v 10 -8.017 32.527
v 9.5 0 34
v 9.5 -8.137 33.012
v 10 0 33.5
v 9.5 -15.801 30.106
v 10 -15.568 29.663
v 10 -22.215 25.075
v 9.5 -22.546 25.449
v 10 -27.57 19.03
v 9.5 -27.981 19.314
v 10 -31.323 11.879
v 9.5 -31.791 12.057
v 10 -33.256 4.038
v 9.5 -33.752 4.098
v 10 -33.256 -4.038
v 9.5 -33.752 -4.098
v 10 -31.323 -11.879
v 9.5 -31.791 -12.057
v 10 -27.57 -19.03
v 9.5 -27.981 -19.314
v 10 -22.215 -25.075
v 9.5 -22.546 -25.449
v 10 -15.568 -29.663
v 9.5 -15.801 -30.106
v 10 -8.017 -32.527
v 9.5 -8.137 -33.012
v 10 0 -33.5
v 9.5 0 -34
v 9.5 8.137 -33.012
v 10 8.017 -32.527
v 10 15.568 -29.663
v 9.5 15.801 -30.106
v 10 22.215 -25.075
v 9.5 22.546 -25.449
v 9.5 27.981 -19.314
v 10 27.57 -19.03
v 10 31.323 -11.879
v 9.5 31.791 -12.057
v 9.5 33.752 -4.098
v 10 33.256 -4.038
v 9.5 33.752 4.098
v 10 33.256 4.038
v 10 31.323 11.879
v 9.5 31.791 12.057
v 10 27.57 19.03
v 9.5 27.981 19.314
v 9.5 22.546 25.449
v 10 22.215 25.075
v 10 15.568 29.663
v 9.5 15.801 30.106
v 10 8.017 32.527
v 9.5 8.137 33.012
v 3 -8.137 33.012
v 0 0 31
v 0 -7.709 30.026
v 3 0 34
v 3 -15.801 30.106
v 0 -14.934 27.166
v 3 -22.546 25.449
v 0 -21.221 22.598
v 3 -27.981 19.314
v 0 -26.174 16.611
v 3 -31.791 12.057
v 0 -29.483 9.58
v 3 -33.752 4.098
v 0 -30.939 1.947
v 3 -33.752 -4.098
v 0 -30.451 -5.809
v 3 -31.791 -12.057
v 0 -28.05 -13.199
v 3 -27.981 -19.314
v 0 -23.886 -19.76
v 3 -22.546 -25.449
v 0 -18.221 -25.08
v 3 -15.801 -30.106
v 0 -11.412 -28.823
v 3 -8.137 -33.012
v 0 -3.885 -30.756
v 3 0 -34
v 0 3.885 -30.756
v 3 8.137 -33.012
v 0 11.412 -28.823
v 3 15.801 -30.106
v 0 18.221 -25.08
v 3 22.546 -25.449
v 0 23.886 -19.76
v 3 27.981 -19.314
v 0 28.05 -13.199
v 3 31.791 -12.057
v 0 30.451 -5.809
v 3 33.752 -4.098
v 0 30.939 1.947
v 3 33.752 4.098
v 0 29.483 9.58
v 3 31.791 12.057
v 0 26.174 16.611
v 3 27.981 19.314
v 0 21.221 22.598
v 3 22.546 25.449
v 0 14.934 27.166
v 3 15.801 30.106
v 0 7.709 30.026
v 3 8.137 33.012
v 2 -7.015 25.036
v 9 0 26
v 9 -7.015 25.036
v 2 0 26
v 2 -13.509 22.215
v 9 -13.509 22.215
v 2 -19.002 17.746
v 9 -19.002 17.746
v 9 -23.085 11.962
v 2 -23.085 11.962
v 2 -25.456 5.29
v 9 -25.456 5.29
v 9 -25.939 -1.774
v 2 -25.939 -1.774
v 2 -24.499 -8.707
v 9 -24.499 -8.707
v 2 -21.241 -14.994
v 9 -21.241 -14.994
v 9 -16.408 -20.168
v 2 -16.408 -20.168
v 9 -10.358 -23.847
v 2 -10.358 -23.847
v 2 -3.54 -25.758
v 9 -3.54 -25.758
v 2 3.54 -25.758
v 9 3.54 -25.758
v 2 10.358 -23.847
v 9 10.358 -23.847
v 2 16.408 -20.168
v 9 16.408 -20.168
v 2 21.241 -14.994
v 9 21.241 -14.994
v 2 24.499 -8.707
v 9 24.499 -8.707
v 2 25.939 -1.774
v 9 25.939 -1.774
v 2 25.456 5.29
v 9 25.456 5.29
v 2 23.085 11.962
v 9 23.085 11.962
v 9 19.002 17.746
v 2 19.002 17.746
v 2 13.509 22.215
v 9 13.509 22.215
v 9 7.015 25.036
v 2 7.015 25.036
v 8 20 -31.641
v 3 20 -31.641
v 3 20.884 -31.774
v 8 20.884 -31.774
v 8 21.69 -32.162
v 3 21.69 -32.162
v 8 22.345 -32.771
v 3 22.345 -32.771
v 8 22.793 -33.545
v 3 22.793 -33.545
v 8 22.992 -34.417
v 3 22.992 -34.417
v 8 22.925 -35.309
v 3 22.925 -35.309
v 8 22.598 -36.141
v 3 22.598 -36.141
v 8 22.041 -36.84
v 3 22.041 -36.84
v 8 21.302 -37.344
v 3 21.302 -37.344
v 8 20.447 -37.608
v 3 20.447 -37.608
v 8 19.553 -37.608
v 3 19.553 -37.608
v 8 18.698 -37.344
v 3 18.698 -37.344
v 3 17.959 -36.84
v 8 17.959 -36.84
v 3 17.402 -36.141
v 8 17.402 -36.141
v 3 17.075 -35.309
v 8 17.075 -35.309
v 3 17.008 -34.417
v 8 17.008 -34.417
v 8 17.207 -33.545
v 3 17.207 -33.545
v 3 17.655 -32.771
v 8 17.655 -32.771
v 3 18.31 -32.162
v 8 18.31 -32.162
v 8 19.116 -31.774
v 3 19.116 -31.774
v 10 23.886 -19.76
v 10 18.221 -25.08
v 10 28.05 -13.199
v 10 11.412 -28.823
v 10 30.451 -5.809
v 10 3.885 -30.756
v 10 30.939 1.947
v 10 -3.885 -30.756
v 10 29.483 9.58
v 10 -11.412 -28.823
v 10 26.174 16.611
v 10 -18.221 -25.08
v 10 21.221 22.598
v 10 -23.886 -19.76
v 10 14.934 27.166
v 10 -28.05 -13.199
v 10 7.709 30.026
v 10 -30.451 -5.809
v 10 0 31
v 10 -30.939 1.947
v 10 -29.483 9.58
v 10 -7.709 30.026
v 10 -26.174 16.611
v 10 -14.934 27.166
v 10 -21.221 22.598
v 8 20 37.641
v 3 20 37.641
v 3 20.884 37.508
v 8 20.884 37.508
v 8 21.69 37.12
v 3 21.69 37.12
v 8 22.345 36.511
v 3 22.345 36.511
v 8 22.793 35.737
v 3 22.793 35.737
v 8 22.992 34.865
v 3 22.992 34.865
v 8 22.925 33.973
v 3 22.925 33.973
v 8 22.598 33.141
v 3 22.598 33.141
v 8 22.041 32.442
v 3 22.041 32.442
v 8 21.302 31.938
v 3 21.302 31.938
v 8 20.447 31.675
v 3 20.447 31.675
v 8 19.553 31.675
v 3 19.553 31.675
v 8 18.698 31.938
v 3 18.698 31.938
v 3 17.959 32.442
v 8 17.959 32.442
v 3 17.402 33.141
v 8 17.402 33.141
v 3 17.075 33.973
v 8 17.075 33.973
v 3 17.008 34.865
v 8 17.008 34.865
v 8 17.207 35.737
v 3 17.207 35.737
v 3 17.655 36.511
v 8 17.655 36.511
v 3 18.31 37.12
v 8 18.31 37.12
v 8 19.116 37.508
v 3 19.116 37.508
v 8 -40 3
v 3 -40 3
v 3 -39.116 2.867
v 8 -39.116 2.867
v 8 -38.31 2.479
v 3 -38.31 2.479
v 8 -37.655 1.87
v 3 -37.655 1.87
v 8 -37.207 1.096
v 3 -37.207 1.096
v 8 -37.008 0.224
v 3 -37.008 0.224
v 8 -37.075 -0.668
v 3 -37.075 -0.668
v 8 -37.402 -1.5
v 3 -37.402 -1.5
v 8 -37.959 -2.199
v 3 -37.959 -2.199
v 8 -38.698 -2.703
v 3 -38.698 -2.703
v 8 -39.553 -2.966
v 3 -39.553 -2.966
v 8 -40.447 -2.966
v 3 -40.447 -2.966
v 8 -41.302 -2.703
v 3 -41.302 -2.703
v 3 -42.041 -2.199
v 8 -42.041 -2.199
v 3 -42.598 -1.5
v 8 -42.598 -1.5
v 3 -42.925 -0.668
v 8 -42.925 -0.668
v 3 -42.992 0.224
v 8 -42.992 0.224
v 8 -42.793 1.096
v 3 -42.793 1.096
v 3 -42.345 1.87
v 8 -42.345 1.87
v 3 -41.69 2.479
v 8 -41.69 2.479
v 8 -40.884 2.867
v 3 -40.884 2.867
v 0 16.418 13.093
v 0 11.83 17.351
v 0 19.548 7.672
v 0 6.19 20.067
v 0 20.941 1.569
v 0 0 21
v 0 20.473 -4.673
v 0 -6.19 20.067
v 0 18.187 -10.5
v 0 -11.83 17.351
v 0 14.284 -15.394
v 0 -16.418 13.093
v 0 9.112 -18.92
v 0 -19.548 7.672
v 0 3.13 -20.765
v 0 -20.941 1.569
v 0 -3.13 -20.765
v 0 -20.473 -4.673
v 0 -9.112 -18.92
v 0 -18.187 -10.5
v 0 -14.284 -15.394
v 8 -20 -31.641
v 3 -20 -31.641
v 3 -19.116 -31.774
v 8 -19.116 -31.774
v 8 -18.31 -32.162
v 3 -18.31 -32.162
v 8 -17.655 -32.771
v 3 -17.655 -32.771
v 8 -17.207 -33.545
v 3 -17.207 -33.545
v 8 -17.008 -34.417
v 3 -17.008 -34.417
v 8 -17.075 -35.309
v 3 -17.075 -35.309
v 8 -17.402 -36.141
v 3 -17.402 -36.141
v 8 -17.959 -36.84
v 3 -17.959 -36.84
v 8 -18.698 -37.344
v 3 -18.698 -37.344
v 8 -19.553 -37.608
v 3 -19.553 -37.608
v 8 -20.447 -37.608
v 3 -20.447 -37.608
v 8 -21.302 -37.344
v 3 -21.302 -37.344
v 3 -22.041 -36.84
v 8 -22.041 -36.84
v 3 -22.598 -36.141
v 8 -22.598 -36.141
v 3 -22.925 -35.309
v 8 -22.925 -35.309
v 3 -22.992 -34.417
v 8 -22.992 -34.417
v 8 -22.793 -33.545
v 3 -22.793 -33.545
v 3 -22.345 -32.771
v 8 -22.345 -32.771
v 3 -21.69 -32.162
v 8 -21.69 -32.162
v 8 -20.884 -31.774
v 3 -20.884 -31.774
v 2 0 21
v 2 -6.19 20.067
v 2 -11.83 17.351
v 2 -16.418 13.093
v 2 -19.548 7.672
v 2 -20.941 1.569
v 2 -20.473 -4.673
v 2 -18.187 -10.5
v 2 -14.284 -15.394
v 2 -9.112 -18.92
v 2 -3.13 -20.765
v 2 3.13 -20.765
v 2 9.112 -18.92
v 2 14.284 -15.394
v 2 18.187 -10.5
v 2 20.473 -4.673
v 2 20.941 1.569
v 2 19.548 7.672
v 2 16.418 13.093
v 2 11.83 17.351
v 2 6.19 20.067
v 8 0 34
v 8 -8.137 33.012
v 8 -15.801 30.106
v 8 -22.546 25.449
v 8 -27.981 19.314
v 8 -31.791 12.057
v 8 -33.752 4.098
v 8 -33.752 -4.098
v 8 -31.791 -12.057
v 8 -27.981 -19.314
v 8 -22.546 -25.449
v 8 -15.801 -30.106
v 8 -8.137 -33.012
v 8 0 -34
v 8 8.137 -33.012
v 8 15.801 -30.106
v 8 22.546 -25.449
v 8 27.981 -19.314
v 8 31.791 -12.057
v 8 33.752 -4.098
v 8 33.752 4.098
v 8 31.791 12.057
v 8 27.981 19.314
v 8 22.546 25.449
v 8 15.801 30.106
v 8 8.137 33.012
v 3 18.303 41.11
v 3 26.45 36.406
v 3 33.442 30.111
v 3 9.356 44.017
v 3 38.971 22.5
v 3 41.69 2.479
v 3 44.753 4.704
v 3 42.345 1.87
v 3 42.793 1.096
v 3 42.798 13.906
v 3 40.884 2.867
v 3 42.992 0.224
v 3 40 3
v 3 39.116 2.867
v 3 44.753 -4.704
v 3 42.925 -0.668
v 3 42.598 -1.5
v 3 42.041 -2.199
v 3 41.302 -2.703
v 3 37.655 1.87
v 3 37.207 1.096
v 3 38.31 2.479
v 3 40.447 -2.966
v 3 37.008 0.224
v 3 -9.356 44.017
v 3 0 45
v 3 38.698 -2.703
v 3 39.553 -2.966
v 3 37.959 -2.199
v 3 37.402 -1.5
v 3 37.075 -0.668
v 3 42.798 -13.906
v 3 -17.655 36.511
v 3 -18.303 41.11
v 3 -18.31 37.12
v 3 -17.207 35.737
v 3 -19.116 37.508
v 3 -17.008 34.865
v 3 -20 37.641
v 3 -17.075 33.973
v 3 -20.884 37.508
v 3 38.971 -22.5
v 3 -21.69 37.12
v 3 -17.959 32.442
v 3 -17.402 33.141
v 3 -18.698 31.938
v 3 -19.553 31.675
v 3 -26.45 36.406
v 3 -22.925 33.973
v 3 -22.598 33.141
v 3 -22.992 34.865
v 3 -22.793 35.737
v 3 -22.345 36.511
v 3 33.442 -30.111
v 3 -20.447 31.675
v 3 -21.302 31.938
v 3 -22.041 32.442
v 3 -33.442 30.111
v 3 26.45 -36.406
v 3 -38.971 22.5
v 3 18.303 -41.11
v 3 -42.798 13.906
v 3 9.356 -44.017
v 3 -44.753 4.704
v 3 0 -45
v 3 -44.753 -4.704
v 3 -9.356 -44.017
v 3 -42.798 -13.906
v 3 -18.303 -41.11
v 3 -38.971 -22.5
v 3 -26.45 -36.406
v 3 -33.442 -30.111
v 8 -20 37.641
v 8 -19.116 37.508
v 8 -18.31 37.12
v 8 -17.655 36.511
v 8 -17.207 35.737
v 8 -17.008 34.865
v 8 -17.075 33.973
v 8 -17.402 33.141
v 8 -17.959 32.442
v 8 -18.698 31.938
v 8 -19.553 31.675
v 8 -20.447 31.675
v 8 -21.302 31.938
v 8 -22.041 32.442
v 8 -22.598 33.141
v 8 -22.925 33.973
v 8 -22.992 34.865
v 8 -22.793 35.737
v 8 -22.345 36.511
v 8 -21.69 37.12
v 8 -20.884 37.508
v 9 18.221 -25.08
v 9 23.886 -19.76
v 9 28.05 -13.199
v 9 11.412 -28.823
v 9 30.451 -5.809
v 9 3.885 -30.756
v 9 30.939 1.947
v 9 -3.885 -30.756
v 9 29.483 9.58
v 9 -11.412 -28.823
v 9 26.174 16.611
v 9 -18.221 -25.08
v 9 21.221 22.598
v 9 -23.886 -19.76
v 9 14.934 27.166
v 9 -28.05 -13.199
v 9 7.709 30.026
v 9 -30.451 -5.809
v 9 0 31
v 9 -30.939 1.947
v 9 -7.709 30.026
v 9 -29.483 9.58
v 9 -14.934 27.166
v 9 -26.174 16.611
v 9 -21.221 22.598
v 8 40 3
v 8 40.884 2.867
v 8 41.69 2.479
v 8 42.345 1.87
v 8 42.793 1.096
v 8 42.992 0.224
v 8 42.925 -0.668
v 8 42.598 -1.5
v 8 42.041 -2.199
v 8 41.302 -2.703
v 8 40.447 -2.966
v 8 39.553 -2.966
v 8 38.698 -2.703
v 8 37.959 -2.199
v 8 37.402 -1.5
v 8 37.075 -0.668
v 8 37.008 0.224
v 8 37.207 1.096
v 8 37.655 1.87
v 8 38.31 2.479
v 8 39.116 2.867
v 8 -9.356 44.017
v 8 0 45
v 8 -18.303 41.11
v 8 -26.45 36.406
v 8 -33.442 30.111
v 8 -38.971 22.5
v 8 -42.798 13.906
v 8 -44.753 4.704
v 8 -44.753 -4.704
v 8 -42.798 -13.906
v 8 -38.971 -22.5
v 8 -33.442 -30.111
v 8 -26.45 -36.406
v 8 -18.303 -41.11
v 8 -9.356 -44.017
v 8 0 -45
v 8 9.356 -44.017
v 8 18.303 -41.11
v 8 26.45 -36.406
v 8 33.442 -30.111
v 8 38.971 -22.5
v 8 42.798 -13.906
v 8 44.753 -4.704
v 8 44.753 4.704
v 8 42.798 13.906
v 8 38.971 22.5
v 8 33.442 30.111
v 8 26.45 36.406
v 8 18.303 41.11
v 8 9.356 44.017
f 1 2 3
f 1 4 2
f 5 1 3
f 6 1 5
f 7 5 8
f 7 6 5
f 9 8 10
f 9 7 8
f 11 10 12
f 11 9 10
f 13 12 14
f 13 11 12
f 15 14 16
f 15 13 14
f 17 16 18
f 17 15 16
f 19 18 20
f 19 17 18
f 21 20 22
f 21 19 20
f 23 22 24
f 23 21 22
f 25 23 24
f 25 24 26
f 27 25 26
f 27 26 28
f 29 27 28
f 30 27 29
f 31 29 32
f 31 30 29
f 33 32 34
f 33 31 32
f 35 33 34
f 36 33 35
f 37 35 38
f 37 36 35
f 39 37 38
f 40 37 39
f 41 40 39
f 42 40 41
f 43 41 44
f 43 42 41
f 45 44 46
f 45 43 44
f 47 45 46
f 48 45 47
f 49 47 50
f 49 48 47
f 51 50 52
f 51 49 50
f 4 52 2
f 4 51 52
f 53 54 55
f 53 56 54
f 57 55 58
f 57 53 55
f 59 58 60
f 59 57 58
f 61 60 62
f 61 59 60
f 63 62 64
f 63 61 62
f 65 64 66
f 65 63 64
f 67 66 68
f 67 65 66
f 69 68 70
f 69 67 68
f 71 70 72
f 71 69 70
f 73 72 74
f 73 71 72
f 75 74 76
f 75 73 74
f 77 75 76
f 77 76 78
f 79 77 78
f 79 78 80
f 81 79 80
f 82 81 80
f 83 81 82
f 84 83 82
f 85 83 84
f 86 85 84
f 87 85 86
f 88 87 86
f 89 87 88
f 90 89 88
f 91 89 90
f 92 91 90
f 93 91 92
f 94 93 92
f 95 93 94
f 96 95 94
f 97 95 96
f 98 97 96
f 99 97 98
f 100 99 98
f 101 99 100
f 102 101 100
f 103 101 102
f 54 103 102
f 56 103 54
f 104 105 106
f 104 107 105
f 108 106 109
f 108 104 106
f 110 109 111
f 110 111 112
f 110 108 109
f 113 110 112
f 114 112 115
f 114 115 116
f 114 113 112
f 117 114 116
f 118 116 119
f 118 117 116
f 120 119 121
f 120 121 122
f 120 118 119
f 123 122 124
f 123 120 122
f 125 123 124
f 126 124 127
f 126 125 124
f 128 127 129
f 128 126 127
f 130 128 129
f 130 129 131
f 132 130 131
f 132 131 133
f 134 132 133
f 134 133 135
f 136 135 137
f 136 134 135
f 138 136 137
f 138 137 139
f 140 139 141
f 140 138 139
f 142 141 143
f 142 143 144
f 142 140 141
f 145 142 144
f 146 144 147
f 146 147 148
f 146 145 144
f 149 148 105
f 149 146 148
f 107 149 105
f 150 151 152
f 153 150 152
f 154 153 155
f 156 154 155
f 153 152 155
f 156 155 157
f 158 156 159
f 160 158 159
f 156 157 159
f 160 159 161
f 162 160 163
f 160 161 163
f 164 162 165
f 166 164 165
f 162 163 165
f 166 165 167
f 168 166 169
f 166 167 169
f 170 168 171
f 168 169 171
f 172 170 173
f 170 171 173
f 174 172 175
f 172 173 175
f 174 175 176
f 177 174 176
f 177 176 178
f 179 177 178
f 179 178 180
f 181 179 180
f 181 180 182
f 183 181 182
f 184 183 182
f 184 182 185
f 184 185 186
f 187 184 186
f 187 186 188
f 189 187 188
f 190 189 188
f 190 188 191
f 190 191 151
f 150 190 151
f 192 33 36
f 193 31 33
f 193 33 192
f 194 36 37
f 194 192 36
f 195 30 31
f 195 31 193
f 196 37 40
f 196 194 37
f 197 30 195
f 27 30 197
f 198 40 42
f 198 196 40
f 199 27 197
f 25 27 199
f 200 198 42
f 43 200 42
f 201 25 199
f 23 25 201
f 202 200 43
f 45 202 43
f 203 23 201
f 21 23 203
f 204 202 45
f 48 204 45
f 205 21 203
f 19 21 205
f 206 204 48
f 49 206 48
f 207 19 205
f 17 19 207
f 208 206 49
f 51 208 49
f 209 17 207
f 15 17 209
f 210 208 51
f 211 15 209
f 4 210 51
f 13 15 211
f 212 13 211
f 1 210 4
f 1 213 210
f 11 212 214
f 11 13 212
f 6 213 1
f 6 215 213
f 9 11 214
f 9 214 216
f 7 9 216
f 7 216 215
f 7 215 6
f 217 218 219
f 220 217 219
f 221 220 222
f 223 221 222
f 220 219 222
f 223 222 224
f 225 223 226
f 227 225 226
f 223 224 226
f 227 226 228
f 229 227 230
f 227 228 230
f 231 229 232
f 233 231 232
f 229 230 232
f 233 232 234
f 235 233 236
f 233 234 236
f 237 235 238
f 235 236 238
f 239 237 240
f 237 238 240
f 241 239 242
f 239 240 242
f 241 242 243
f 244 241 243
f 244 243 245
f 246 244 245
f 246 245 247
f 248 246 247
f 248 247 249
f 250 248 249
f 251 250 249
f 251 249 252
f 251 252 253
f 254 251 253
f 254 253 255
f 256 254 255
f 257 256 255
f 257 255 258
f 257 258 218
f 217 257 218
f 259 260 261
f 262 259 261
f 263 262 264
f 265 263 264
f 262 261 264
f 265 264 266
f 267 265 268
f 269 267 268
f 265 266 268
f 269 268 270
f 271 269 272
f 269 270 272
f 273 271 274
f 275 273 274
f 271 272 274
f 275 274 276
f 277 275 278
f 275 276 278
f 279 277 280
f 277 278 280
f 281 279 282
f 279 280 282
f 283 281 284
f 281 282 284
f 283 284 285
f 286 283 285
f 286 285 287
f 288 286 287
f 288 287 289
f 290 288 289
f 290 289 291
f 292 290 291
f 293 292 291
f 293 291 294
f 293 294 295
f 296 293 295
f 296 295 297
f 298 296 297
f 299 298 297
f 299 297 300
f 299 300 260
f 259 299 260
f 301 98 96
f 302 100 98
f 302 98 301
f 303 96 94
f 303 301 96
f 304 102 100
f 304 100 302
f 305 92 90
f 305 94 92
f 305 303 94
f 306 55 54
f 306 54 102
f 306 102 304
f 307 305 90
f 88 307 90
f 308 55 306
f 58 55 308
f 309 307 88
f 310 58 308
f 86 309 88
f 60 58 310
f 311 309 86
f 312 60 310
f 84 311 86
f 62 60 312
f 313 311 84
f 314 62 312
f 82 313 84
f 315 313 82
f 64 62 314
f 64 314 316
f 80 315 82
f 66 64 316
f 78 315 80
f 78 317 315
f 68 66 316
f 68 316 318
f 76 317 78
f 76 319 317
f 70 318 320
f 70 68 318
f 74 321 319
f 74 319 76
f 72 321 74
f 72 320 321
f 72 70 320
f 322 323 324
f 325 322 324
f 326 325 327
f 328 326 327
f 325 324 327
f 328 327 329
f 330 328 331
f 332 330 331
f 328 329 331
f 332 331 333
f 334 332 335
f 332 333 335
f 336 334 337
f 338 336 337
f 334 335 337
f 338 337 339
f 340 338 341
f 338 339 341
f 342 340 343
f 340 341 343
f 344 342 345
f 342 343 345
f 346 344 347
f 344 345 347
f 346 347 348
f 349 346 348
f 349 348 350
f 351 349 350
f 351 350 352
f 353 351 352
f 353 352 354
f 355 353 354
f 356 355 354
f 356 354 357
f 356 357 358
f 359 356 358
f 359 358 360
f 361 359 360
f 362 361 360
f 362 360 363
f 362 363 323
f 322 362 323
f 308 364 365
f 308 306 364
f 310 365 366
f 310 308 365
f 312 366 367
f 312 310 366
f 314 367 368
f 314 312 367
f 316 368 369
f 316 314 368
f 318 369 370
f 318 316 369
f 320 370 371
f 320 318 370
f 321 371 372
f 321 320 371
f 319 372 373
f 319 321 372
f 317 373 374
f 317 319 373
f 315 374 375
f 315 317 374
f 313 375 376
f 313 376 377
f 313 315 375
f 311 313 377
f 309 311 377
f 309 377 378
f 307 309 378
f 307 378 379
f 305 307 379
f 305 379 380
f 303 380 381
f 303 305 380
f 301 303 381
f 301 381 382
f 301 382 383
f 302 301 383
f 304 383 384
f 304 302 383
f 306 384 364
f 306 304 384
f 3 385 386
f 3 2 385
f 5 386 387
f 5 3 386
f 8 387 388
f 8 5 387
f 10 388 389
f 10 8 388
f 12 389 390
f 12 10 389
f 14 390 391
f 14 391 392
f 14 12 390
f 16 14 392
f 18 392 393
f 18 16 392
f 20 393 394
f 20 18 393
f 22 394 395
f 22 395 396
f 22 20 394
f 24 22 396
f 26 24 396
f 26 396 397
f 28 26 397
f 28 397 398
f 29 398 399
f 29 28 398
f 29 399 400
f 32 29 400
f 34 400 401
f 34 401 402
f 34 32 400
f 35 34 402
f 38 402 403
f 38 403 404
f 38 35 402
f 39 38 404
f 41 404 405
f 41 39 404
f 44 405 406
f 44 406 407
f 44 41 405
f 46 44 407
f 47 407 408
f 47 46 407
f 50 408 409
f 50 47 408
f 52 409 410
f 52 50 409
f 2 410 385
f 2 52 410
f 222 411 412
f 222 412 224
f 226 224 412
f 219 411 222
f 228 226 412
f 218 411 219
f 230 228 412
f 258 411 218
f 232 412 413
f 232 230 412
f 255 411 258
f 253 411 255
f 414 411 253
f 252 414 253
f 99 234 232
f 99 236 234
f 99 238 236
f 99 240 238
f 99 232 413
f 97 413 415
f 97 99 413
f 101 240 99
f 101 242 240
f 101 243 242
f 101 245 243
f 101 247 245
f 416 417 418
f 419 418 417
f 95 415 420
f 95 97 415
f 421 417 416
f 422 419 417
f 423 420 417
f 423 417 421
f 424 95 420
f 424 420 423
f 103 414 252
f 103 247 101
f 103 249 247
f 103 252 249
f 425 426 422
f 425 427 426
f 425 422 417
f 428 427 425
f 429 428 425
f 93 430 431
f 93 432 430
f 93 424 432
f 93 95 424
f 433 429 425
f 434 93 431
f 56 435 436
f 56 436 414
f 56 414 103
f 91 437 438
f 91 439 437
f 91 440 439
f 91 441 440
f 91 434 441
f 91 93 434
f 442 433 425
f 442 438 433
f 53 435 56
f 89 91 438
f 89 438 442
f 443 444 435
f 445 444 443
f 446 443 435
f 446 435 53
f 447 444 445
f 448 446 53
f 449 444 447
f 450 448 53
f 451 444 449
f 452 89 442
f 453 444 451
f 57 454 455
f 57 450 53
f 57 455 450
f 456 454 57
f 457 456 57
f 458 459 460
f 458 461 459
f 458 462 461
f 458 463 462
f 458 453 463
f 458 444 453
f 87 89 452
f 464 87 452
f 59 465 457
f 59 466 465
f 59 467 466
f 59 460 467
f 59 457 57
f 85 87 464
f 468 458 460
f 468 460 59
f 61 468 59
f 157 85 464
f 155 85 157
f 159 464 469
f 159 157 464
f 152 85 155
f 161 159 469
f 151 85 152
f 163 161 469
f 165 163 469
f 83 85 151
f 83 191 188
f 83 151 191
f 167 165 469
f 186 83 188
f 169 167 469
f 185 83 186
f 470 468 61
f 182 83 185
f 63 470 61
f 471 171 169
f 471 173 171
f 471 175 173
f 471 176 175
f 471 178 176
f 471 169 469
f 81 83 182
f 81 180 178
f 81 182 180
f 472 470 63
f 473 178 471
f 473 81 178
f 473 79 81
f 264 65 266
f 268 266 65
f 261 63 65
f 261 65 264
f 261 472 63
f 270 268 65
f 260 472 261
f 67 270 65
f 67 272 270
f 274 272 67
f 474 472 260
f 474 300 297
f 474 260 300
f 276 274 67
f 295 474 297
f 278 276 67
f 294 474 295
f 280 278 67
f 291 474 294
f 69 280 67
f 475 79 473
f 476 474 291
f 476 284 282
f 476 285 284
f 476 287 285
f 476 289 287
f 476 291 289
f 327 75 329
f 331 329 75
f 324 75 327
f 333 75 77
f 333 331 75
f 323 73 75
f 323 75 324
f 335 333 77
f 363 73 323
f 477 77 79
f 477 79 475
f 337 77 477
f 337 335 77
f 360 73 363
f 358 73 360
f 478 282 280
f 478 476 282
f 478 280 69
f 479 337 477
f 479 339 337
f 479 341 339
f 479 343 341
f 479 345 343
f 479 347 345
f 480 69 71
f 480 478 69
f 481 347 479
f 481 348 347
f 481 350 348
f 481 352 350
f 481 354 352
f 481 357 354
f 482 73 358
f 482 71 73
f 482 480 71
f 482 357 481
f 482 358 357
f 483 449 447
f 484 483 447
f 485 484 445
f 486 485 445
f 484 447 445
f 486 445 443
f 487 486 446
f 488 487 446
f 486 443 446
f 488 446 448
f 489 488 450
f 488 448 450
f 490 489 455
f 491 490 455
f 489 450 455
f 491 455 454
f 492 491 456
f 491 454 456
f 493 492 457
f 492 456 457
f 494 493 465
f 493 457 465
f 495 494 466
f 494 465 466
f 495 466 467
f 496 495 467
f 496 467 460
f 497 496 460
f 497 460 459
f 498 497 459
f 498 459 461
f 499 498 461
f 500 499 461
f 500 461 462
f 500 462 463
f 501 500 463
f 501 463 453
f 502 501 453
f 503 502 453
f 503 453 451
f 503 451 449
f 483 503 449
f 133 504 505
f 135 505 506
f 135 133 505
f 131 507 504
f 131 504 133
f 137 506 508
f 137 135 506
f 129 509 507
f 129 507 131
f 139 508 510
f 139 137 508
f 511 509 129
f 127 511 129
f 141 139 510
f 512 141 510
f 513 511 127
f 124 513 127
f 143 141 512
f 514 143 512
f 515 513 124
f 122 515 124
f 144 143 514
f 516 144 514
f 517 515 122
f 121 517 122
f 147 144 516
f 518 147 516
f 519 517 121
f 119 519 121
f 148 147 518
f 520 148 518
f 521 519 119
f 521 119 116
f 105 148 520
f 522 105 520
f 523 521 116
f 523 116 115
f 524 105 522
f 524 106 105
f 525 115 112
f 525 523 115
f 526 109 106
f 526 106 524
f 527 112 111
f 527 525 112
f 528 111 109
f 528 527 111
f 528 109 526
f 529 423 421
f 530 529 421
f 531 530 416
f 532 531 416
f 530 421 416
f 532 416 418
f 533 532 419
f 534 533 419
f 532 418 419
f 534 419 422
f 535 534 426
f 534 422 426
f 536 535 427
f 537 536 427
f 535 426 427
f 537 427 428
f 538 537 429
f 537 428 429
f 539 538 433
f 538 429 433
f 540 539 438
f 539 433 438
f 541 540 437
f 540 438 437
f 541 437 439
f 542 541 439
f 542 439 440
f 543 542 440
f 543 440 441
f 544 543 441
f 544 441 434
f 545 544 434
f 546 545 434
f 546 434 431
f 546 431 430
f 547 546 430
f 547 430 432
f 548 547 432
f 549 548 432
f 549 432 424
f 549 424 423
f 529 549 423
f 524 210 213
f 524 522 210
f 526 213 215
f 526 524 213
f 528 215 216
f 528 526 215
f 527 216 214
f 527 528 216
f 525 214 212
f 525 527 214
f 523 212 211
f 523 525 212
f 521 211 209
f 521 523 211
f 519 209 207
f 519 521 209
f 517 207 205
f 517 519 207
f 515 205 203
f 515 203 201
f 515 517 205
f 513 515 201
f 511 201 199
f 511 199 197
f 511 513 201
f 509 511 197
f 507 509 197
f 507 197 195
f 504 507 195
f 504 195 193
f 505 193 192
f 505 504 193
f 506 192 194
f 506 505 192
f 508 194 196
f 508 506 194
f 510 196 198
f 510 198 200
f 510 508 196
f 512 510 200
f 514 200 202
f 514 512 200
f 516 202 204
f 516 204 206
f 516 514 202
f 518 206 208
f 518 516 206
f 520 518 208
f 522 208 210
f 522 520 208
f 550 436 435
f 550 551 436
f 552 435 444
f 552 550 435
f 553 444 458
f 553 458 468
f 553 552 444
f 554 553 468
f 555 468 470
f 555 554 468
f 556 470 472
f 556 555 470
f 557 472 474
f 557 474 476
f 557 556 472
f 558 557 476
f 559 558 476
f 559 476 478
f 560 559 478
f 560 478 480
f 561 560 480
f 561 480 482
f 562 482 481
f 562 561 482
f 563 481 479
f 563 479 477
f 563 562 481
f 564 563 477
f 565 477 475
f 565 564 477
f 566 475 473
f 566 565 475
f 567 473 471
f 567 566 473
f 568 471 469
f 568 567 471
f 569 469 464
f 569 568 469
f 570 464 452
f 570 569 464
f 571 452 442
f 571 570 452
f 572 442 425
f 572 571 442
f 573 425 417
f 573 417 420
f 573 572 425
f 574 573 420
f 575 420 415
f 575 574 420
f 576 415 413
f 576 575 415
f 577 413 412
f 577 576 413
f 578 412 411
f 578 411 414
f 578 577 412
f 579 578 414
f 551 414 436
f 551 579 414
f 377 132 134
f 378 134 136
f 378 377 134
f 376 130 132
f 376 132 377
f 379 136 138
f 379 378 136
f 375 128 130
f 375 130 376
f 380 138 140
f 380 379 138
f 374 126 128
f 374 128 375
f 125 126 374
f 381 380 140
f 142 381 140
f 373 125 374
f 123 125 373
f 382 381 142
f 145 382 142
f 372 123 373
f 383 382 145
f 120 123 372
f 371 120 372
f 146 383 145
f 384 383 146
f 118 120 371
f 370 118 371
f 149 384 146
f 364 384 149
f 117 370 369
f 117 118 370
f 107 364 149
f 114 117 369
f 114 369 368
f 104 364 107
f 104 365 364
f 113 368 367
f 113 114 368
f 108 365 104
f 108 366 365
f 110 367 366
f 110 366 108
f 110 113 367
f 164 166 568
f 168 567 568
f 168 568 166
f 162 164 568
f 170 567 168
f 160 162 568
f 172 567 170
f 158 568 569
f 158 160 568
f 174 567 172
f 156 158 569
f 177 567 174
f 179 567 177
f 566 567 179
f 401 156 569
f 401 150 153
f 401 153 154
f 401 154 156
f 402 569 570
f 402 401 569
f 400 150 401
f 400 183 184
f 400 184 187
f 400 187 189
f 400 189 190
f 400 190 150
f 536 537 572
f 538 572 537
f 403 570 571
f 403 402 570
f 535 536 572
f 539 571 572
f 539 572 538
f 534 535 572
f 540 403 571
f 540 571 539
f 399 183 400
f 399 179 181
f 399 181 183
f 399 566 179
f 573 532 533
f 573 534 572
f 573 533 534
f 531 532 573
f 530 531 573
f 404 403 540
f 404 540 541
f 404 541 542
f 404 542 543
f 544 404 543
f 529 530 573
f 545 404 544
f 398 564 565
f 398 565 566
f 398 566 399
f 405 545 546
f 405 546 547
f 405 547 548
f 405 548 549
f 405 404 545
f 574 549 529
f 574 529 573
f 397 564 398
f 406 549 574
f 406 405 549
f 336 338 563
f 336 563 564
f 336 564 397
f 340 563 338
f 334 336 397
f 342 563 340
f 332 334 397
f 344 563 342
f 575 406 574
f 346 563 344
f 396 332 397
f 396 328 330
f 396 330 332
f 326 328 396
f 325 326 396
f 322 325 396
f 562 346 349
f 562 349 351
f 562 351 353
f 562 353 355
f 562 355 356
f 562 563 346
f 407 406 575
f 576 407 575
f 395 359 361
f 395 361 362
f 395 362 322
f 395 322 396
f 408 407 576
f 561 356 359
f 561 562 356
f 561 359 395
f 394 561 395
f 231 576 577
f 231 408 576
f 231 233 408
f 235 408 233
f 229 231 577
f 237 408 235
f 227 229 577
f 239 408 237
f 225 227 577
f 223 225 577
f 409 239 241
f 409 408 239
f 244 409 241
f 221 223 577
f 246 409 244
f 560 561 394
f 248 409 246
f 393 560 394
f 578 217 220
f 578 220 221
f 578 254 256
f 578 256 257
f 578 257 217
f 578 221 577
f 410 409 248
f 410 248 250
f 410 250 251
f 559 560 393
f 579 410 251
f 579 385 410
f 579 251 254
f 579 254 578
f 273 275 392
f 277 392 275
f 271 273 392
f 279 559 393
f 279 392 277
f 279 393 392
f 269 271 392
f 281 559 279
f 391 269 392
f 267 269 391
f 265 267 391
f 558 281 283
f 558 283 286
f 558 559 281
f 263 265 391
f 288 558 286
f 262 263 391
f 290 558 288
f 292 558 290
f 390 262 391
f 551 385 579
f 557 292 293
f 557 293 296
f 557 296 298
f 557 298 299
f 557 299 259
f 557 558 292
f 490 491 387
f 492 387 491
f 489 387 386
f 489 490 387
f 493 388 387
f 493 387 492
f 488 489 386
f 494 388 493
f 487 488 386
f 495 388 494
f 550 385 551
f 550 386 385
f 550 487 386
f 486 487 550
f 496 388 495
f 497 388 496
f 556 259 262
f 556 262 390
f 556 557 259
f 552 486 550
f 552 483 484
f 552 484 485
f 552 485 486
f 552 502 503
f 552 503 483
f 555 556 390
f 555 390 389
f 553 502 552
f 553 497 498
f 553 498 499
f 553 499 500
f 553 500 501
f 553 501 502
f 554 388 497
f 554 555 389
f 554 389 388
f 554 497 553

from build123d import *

# Parameters (mm, degrees)
SKETCH2_R          = 3
CUT_EXTRUDE1_DEPTH = 10


with BuildPart() as part:
    # Sketch1 → Revolve1 (revolve)
    with BuildSketch(Plane(origin=(0, 0, 0), x_dir=(1, 0, 0), z_dir=(0, 1, 0)), mode=Mode.PRIVATE) as revolve1_sk:
        Polygon((0, 21), (0, 31), (3, 34), (3, 45), (8, 45), (8, 34), (9.5, 34), (10, 33.5), (10, 31), (9, 31), (9, 26), (2, 26), (2, 21), align=None)
    revolve(revolve1_sk.sketch.rotate(Axis((0, 0, 0), (1, 0, 0)), 180), axis=Axis((0, 0, 0), (1, 0, 0)))

    # Sketch2 → Cut-Extrude1 (cut)
    with BuildSketch(Plane.ZY.offset(-3)):
        with Locations((0, 40)):
            Circle(SKETCH2_R)
        with Locations((34.641016151, 20)):
            Circle(SKETCH2_R)
        with Locations((34.641016151, -20)):
            Circle(SKETCH2_R)
        with Locations((0, -40)):
            Circle(SKETCH2_R)
        with Locations((-34.641016151, -20)):
            Circle(SKETCH2_R)
        with Locations((-34.641016151, 20)):
            Circle(SKETCH2_R)
    extrude(amount=-CUT_EXTRUDE1_DEPTH, mode=Mode.SUBTRACT)


solid = part.part
